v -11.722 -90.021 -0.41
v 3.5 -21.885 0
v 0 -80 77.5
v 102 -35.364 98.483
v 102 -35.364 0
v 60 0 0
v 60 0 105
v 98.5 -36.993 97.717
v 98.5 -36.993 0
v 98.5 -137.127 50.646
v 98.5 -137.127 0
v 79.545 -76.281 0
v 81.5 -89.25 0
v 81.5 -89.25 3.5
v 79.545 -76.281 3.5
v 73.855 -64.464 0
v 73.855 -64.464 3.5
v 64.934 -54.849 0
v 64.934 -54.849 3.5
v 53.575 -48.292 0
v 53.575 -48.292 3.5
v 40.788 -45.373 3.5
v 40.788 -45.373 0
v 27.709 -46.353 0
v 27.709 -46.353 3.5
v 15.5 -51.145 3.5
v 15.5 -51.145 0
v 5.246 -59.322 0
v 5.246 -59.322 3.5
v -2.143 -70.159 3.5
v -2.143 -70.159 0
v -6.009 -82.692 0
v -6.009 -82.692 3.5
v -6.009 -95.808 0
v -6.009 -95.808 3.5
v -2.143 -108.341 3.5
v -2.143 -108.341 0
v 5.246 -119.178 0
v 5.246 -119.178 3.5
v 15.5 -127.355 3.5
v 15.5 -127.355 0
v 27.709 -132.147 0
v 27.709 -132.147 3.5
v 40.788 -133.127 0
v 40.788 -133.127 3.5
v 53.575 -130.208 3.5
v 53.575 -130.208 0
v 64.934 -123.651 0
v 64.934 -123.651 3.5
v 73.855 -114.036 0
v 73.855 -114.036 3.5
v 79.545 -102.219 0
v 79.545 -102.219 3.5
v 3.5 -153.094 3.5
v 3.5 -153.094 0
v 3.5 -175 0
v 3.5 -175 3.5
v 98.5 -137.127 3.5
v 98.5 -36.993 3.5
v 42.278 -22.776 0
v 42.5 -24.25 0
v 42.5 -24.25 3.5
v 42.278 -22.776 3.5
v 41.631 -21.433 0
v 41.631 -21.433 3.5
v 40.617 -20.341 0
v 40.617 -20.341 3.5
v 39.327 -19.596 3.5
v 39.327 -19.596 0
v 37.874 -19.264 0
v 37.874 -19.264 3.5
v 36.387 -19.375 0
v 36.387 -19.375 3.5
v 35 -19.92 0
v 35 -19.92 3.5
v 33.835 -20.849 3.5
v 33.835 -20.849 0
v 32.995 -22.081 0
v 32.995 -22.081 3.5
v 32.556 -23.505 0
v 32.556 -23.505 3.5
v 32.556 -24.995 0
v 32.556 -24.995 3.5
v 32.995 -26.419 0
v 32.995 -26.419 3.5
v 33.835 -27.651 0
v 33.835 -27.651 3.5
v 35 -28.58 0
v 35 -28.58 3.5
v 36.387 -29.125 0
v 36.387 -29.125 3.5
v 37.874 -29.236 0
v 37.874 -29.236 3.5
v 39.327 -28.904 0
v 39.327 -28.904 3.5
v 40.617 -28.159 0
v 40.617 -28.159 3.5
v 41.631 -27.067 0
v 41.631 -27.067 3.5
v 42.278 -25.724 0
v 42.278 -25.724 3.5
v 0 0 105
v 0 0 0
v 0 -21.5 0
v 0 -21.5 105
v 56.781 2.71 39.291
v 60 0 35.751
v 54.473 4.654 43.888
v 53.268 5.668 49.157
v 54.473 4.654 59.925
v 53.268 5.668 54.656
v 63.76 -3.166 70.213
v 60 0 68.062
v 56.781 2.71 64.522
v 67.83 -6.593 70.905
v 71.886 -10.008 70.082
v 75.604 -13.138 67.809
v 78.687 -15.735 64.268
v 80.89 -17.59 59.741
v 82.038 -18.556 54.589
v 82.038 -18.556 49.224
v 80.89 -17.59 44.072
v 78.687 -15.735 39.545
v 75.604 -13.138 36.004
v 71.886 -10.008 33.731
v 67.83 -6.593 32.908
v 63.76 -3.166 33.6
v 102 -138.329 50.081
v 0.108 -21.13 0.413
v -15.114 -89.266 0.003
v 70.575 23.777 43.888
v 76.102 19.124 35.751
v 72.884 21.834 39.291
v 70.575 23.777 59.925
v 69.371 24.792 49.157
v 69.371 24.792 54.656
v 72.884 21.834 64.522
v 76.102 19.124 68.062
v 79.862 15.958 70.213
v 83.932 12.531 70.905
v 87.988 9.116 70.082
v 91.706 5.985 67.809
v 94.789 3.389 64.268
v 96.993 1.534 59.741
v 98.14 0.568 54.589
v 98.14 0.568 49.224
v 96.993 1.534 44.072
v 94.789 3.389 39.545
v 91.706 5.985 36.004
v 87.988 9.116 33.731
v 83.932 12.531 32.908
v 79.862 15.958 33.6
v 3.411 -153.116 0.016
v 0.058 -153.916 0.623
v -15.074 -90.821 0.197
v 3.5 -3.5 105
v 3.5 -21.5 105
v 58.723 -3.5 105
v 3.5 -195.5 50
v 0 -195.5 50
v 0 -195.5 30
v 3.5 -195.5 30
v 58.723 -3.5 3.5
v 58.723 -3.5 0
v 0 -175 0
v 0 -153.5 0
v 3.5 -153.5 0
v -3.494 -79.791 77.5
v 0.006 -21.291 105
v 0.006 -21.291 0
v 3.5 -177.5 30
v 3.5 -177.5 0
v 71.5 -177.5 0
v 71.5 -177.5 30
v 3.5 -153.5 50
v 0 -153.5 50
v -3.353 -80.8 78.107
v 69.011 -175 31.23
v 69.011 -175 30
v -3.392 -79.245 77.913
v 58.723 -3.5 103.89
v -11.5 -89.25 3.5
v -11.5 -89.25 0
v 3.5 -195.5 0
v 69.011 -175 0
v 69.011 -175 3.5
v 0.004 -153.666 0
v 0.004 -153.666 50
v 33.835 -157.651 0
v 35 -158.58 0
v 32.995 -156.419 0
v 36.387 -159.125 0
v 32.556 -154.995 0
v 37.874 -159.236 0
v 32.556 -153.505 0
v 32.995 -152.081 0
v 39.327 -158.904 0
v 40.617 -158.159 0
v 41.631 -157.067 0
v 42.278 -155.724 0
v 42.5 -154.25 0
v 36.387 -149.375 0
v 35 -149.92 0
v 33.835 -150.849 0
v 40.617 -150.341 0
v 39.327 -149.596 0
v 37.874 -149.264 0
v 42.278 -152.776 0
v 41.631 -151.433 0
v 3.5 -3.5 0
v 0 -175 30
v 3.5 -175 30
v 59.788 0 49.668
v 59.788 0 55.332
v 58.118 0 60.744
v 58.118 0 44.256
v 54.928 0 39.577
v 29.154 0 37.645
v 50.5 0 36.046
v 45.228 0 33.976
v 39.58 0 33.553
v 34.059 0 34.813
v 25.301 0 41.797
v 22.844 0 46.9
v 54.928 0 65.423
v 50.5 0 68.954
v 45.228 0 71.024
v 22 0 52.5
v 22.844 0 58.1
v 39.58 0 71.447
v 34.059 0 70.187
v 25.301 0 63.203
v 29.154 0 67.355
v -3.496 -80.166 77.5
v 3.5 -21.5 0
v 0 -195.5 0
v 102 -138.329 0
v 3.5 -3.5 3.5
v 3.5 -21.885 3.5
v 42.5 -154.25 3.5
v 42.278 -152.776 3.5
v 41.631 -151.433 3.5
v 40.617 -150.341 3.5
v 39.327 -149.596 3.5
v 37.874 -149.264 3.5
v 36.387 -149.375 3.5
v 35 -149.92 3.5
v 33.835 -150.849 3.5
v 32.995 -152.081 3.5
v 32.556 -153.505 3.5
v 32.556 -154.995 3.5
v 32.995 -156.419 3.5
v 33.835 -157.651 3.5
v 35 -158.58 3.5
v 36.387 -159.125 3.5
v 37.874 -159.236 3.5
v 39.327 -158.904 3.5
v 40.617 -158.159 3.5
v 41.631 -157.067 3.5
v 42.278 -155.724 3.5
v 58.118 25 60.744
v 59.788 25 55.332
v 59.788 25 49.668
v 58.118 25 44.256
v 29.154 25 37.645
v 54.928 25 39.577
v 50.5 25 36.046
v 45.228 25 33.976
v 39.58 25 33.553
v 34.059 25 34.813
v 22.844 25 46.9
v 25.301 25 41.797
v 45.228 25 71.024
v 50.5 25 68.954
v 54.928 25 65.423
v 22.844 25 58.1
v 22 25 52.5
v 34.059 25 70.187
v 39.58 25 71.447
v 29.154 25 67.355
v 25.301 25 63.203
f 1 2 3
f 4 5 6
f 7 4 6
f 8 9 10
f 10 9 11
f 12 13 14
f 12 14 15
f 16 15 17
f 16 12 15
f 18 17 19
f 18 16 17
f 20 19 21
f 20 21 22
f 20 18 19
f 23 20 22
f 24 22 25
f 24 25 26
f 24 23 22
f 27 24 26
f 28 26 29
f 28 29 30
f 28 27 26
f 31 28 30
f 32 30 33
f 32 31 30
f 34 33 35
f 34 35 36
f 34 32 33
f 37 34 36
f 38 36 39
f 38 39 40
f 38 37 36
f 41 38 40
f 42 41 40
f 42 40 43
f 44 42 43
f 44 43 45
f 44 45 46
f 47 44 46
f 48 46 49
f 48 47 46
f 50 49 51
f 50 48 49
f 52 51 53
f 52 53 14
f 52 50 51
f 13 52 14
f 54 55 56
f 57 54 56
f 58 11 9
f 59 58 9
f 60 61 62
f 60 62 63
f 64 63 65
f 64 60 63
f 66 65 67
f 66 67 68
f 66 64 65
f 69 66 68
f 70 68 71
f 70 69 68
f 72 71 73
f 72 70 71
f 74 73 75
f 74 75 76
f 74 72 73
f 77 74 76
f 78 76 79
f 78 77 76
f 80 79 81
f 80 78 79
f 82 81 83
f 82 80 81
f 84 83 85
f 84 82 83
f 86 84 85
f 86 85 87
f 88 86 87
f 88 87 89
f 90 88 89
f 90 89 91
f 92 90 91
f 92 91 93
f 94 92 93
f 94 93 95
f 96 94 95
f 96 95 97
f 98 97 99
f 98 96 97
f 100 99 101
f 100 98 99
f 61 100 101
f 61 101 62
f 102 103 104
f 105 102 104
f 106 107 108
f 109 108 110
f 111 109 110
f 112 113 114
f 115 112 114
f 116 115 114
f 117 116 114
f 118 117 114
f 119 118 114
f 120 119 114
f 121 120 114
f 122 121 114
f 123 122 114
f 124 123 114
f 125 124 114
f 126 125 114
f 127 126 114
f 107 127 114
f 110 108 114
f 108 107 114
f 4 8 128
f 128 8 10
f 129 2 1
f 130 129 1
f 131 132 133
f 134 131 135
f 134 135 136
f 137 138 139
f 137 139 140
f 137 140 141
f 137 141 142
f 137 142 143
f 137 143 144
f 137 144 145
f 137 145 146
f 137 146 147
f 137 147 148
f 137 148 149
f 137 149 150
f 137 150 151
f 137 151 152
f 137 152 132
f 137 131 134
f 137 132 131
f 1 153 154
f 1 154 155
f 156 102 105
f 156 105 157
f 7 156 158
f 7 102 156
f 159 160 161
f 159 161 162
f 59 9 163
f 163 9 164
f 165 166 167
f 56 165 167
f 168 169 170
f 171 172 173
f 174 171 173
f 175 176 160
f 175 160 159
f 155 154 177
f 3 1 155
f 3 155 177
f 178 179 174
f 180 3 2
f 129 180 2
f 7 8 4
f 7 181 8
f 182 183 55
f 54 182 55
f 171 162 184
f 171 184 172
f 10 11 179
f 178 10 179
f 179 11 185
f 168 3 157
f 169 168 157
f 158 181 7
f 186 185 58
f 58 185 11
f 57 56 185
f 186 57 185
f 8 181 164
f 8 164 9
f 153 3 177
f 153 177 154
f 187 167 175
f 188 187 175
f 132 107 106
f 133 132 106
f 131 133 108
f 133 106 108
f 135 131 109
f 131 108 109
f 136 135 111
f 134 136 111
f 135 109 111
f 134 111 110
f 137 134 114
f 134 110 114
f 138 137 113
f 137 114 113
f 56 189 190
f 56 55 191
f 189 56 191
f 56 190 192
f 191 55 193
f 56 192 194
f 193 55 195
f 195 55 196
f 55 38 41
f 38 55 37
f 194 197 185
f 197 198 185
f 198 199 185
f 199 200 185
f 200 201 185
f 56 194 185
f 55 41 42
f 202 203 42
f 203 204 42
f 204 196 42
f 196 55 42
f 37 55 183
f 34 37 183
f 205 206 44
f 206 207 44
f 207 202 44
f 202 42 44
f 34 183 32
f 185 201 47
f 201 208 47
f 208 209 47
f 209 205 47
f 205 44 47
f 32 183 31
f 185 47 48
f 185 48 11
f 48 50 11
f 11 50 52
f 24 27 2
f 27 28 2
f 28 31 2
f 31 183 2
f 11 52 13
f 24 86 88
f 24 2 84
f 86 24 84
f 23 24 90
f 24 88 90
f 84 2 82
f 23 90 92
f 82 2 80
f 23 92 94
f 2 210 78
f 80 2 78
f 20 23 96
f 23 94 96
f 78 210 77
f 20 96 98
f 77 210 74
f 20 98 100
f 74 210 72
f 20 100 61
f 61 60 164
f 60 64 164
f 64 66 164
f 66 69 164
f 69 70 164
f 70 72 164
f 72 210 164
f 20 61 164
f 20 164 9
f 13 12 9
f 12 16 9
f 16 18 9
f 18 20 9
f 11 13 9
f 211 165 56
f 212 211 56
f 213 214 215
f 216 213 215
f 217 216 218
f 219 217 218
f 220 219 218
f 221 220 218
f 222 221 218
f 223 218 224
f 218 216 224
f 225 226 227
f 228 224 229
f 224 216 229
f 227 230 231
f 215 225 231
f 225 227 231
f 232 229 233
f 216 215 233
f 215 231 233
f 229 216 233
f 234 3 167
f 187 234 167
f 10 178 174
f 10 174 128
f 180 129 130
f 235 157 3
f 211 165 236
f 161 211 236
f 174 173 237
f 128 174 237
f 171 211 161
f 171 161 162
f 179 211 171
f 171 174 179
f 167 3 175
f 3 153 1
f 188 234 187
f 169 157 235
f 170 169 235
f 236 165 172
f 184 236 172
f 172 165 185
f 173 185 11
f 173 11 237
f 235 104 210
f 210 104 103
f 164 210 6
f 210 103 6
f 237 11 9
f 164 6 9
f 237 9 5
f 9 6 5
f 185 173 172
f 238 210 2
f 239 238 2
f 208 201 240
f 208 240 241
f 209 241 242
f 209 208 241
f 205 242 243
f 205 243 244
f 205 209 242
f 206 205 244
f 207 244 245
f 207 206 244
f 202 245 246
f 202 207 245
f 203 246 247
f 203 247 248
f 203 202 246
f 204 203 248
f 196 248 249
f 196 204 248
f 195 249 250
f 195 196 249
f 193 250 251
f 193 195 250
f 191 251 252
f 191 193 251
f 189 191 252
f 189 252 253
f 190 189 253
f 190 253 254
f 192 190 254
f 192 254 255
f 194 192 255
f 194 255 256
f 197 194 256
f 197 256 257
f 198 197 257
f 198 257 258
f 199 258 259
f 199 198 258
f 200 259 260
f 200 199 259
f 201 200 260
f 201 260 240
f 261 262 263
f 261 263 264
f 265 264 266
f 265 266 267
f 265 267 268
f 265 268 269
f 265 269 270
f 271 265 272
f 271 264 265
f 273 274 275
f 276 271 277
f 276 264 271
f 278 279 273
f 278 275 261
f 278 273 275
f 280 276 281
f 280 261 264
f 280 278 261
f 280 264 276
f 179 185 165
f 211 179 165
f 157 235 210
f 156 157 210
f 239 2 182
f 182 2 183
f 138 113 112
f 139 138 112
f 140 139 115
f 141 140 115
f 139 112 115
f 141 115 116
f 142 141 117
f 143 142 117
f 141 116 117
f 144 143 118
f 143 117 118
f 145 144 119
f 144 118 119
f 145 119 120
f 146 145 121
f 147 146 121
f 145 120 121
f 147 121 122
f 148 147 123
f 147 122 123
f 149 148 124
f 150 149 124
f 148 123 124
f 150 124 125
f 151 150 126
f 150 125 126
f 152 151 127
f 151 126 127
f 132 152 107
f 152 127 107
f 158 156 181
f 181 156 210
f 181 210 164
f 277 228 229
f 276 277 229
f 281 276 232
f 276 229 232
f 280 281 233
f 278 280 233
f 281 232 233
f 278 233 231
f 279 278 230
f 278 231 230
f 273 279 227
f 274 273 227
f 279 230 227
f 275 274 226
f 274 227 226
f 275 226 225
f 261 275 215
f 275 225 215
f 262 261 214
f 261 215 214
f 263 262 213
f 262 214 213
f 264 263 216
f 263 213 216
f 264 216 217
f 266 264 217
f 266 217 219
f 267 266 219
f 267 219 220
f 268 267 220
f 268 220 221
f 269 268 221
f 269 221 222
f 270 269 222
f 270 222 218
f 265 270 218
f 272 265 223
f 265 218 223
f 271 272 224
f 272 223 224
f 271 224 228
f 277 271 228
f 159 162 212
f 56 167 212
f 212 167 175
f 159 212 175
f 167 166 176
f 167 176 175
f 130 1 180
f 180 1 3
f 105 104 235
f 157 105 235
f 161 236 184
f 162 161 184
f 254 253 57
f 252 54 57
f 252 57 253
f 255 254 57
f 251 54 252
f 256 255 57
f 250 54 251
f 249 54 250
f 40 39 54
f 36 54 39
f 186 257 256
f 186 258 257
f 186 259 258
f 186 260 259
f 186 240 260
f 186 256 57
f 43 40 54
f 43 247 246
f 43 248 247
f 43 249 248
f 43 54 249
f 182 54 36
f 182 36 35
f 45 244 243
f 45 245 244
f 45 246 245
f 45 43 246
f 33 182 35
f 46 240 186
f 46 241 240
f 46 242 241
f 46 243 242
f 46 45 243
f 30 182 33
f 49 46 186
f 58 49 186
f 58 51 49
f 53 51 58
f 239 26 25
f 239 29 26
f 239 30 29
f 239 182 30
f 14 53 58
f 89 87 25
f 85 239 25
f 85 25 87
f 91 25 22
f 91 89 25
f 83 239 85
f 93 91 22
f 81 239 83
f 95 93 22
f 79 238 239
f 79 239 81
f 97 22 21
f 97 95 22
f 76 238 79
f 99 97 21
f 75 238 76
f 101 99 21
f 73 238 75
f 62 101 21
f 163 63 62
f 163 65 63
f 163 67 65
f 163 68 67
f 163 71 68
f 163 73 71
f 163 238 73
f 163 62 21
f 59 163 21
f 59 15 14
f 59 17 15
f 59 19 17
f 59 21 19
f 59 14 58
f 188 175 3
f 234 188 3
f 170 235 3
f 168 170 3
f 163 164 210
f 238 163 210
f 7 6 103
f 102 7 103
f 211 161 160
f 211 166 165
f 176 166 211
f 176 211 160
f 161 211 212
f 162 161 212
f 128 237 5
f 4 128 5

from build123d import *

# Parameters (mm, degrees)
F0_W      = 3.5
F0_H      = 18
F6_DEPTH  = 30
F7_REACH  = 201.50633824
F8_DEPTH  = 105
F10_REACH = 161.9332117682
F12_REACH = 102.7827771036
F15_DEPTH = 25
F16_DEPTH = 25
F0_R      = 5
F0_R_2    = 44
F17_DEPTH = 3.5
F21_DEPTH = 3.5
F0_H_2    = 21.5
F22_DEPTH = 50
F26_DEPTH = 3.5
F30_DEPTH = 3.5
F34_DEPTH = 3.5
F35_W     = 3.5
F35_H     = 20
F36_DEPTH = 20.5


with BuildPart() as f6:
    # F0 (on Top) → F6 (new body, through all)
    with BuildSketch(Plane.XY):
        Polygon((3.5, -177.5), (71.5, -177.5), (69.0107278246, -175), (3.5, -175), (0, -175), (0, -177.5), align=None)
        with Locations((1.75, -186.5)):
            Rectangle(F0_W, F0_H)
    extrude(amount=F6_DEPTH)



with BuildPart() as f7:
    f7_end = Plane(origin=(0, -44.3168900323, 94.2741115233), x_dir=(0, -0.9049939228, -0.4254244936), z_dir=(0, 0.4254244936, -0.9049939228))
    # F0 (on Top) → F7 (new body, up to a plane its end follows)
    with BuildSketch(Plane.XY):
        Polygon((102, -138.3286694261), (102, -35.3643643935), (98.5, -36.9928108308), (98.5, -137.1267531552), align=None)
    f7_long = extrude(amount=F7_REACH, mode=Mode.PRIVATE)
    add(split(f7_long, bisect_by=f7_end, keep=Keep.TOP, mode=Mode.PRIVATE))



with BuildPart() as f8:
    # F0 (on Top) → F8 (new body, through all)
    with BuildSketch(Plane.XY):
        Polygon((60, 0), (0, 0), (0, -21.5), (3.5, -21.5), (3.5, -3.5), (58.722724796, -3.5), align=None)
    extrude(amount=F8_DEPTH)


with BuildPart() as f7_1:
    add(f7.part)

    add(f8.part)  # F10 merges F8
    f10_end = Plane(origin=(60, 0, 105), x_dir=(0, 0.9614490001, 0.2749833091), z_dir=(-0.0820657574, -0.2740557675, 0.9582059527))
    # F0 (on Top) → F10 (join, up to a plane its end follows)
    with BuildSketch(Plane.XY):
        Polygon((102, -35.3643643935), (60, 0), (58.722724796, -3.5), (98.5, -36.9928108308), align=None)
    f10_long = extrude(amount=F10_REACH, mode=Mode.PRIVATE)
    add(split(f10_long, bisect_by=f10_end, keep=Keep.BOTTOM, mode=Mode.PRIVATE))


with BuildPart() as f6_1:
    add(f6.part)

    add(f7_1.part)  # F12 merges F7
    f12_end = Plane(origin=(98.5, -137.1267531552, 50.6455433886), x_dir=(0, 0.8931169065, 0.4498246228), z_dir=(-0.0102958733, -0.4498007803, 0.8930695679))
    # F0 (on Top) → F12 (join, up to a plane its end follows)
    with BuildSketch(Plane.XY):
        Polygon((71.5, -177.5), (102, -138.3286694261), (98.5, -137.1267531552), (69.0107278246, -175), align=None)
    f12_long = extrude(amount=F12_REACH, mode=Mode.PRIVATE)
    add(split(f12_long, bisect_by=f12_end, keep=Keep.BOTTOM, mode=Mode.PRIVATE))


with BuildPart() as f15:
    # F13 (on face) → F15 (new body)
    with BuildSketch(Plane(origin=(0, 0, 0), x_dir=(-1, 0, 0), z_dir=(0, 1, 0))):
        with BuildLine():
            ThreePointArc((-60, 52.5), (-41, 33.5), (-22, 52.5))
            ThreePointArc((-22, 52.5), (-41, 71.5), (-60, 52.5))
        make_face()
    extrude(amount=F15_DEPTH)


with BuildPart() as f16:
    # F14 (on face) → F16 (new body)
    with BuildSketch(Plane(origin=(24.8913101482, 29.5618214594, 0), x_dir=(-0.7649476001, 0.644092516, 0), z_dir=(0.644092516, 0.7649476001, 0))):
        with BuildLine():
            Line((-45.8968560046, 35.7509940048), (-45.8968560046, 68.0619828476))
            ThreePointArc((-45.8968560046, 68.0619828476), (-74.8968560046, 51.9064884262), (-45.8968560046, 35.7509940048))
        make_face()
        with BuildLine():
            ThreePointArc((-45.8968560046, 35.7509940048), (-39.2986633319, 42.6598674217), (-36.8968560046, 51.9064884262))
            ThreePointArc((-36.8968560046, 51.9064884262), (-39.2986633319, 61.1531094306), (-45.8968560046, 68.0619828476))
            Line((-45.8968560046, 68.0619828476), (-45.8968560046, 35.7509940048))
        make_face()
    extrude(amount=F16_DEPTH)


with BuildPart() as f17:
    # F0 (on Top) → F17 (new body)
    with BuildSketch(Plane.XY):
        Polygon((98.5, -36.9928108308), (58.722724796, -3.5), (3.5, -3.5), (3.5, -21.5), (3.5, -21.8849541017), (-11.5, -89.25), (3.5, -153.094366445), (3.5, -153.5), (3.5, -175), (69.0107278246, -175), (98.5, -137.1267531552), align=None)
        with Locations((37.5, -154.25)):
            Circle(F0_R, mode=Mode.SUBTRACT)
        with Locations((37.5, -89.25)):
            Circle(F0_R_2, mode=Mode.SUBTRACT)
        with Locations((37.5, -24.25)):
            Circle(F0_R, mode=Mode.SUBTRACT)
    extrude(amount=F17_DEPTH)


with BuildPart() as f21:
    # F20 (on 3pt) → F21 (new body)
    with BuildSketch(Plane(origin=(7.8663280231, -1.7515748527, -0.9582026436), x_dir=(-0.2142407567, -0.9764322069, 0.0260968089), z_dir=(-0.9692677662, 0.2158243389, 0.1180671507))):
        Polygon((80.1370792473, 76.9313541176), (20.619331384, 0.4232091326), (90.4000018708, -1.8246819942), align=None)
    extrude(amount=F21_DEPTH)


with BuildPart() as f22:
    # F0 (on Top) → F22 (new body)
    with BuildSketch(Plane.XY):
        with Locations((1.75, -164.25)):
            Rectangle(F0_W, F0_H_2)
    extrude(amount=F22_DEPTH)

    # F35 (on face) → F36 (join, through all)
    with BuildSketch(Plane.XZ.offset(175)):
        with Locations((1.75, 40)):
            Rectangle(F35_W, F35_H)
    extrude(amount=F36_DEPTH)


with BuildPart() as f26:
    # F25 (on 3pt) → F26 (new body)
    with BuildSketch(Plane(origin=(-30.3997140605, -7.2539765203, 5.5066874197), x_dir=(-0.2249220316, 0.9735245699, 0.0407429925), z_dir=(0.9579352039, 0.228582396, -0.1735230051))):
        Polygon((-149.8283543617, 0.623847139), (-85.0179586872, -2.493068384), (-74.7243836748, 76.2589672614), align=None)
    extrude(amount=-F26_DEPTH)


with BuildPart() as f30:
    # F29 (on 3pt) → F30 (new body)
    with BuildSketch(Plane(origin=(4.7692531664, -0.285339933, 0), x_dir=(-0.0597222669, -0.9982150324, 0), z_dir=(-0.9982150324, 0.0597222669, 0))):
        Polygon((79.8572025891, 77.5), (21.2525952617, 105.0000000001), (21.2525952617, 0), align=None)
    extrude(amount=F30_DEPTH)


with BuildPart() as f34:
    # F33 (on 3pt) → F34 (new body)
    with BuildSketch(Plane(origin=(-3.8009049774, -0.1809954751, 0), x_dir=(0.0475651494, -0.9988681377, 0), z_dir=(-0.9988681377, -0.0475651494, 0))):
        Polygon((153.4927371637, 50), (79.909451018, 77.5), (153.4927371637, 0), align=None)
    extrude(amount=F34_DEPTH)


solid = Compound([f6_1.part, f15.part, f16.part, f17.part, f21.part, f22.part, f26.part, f30.part, f34.part])
